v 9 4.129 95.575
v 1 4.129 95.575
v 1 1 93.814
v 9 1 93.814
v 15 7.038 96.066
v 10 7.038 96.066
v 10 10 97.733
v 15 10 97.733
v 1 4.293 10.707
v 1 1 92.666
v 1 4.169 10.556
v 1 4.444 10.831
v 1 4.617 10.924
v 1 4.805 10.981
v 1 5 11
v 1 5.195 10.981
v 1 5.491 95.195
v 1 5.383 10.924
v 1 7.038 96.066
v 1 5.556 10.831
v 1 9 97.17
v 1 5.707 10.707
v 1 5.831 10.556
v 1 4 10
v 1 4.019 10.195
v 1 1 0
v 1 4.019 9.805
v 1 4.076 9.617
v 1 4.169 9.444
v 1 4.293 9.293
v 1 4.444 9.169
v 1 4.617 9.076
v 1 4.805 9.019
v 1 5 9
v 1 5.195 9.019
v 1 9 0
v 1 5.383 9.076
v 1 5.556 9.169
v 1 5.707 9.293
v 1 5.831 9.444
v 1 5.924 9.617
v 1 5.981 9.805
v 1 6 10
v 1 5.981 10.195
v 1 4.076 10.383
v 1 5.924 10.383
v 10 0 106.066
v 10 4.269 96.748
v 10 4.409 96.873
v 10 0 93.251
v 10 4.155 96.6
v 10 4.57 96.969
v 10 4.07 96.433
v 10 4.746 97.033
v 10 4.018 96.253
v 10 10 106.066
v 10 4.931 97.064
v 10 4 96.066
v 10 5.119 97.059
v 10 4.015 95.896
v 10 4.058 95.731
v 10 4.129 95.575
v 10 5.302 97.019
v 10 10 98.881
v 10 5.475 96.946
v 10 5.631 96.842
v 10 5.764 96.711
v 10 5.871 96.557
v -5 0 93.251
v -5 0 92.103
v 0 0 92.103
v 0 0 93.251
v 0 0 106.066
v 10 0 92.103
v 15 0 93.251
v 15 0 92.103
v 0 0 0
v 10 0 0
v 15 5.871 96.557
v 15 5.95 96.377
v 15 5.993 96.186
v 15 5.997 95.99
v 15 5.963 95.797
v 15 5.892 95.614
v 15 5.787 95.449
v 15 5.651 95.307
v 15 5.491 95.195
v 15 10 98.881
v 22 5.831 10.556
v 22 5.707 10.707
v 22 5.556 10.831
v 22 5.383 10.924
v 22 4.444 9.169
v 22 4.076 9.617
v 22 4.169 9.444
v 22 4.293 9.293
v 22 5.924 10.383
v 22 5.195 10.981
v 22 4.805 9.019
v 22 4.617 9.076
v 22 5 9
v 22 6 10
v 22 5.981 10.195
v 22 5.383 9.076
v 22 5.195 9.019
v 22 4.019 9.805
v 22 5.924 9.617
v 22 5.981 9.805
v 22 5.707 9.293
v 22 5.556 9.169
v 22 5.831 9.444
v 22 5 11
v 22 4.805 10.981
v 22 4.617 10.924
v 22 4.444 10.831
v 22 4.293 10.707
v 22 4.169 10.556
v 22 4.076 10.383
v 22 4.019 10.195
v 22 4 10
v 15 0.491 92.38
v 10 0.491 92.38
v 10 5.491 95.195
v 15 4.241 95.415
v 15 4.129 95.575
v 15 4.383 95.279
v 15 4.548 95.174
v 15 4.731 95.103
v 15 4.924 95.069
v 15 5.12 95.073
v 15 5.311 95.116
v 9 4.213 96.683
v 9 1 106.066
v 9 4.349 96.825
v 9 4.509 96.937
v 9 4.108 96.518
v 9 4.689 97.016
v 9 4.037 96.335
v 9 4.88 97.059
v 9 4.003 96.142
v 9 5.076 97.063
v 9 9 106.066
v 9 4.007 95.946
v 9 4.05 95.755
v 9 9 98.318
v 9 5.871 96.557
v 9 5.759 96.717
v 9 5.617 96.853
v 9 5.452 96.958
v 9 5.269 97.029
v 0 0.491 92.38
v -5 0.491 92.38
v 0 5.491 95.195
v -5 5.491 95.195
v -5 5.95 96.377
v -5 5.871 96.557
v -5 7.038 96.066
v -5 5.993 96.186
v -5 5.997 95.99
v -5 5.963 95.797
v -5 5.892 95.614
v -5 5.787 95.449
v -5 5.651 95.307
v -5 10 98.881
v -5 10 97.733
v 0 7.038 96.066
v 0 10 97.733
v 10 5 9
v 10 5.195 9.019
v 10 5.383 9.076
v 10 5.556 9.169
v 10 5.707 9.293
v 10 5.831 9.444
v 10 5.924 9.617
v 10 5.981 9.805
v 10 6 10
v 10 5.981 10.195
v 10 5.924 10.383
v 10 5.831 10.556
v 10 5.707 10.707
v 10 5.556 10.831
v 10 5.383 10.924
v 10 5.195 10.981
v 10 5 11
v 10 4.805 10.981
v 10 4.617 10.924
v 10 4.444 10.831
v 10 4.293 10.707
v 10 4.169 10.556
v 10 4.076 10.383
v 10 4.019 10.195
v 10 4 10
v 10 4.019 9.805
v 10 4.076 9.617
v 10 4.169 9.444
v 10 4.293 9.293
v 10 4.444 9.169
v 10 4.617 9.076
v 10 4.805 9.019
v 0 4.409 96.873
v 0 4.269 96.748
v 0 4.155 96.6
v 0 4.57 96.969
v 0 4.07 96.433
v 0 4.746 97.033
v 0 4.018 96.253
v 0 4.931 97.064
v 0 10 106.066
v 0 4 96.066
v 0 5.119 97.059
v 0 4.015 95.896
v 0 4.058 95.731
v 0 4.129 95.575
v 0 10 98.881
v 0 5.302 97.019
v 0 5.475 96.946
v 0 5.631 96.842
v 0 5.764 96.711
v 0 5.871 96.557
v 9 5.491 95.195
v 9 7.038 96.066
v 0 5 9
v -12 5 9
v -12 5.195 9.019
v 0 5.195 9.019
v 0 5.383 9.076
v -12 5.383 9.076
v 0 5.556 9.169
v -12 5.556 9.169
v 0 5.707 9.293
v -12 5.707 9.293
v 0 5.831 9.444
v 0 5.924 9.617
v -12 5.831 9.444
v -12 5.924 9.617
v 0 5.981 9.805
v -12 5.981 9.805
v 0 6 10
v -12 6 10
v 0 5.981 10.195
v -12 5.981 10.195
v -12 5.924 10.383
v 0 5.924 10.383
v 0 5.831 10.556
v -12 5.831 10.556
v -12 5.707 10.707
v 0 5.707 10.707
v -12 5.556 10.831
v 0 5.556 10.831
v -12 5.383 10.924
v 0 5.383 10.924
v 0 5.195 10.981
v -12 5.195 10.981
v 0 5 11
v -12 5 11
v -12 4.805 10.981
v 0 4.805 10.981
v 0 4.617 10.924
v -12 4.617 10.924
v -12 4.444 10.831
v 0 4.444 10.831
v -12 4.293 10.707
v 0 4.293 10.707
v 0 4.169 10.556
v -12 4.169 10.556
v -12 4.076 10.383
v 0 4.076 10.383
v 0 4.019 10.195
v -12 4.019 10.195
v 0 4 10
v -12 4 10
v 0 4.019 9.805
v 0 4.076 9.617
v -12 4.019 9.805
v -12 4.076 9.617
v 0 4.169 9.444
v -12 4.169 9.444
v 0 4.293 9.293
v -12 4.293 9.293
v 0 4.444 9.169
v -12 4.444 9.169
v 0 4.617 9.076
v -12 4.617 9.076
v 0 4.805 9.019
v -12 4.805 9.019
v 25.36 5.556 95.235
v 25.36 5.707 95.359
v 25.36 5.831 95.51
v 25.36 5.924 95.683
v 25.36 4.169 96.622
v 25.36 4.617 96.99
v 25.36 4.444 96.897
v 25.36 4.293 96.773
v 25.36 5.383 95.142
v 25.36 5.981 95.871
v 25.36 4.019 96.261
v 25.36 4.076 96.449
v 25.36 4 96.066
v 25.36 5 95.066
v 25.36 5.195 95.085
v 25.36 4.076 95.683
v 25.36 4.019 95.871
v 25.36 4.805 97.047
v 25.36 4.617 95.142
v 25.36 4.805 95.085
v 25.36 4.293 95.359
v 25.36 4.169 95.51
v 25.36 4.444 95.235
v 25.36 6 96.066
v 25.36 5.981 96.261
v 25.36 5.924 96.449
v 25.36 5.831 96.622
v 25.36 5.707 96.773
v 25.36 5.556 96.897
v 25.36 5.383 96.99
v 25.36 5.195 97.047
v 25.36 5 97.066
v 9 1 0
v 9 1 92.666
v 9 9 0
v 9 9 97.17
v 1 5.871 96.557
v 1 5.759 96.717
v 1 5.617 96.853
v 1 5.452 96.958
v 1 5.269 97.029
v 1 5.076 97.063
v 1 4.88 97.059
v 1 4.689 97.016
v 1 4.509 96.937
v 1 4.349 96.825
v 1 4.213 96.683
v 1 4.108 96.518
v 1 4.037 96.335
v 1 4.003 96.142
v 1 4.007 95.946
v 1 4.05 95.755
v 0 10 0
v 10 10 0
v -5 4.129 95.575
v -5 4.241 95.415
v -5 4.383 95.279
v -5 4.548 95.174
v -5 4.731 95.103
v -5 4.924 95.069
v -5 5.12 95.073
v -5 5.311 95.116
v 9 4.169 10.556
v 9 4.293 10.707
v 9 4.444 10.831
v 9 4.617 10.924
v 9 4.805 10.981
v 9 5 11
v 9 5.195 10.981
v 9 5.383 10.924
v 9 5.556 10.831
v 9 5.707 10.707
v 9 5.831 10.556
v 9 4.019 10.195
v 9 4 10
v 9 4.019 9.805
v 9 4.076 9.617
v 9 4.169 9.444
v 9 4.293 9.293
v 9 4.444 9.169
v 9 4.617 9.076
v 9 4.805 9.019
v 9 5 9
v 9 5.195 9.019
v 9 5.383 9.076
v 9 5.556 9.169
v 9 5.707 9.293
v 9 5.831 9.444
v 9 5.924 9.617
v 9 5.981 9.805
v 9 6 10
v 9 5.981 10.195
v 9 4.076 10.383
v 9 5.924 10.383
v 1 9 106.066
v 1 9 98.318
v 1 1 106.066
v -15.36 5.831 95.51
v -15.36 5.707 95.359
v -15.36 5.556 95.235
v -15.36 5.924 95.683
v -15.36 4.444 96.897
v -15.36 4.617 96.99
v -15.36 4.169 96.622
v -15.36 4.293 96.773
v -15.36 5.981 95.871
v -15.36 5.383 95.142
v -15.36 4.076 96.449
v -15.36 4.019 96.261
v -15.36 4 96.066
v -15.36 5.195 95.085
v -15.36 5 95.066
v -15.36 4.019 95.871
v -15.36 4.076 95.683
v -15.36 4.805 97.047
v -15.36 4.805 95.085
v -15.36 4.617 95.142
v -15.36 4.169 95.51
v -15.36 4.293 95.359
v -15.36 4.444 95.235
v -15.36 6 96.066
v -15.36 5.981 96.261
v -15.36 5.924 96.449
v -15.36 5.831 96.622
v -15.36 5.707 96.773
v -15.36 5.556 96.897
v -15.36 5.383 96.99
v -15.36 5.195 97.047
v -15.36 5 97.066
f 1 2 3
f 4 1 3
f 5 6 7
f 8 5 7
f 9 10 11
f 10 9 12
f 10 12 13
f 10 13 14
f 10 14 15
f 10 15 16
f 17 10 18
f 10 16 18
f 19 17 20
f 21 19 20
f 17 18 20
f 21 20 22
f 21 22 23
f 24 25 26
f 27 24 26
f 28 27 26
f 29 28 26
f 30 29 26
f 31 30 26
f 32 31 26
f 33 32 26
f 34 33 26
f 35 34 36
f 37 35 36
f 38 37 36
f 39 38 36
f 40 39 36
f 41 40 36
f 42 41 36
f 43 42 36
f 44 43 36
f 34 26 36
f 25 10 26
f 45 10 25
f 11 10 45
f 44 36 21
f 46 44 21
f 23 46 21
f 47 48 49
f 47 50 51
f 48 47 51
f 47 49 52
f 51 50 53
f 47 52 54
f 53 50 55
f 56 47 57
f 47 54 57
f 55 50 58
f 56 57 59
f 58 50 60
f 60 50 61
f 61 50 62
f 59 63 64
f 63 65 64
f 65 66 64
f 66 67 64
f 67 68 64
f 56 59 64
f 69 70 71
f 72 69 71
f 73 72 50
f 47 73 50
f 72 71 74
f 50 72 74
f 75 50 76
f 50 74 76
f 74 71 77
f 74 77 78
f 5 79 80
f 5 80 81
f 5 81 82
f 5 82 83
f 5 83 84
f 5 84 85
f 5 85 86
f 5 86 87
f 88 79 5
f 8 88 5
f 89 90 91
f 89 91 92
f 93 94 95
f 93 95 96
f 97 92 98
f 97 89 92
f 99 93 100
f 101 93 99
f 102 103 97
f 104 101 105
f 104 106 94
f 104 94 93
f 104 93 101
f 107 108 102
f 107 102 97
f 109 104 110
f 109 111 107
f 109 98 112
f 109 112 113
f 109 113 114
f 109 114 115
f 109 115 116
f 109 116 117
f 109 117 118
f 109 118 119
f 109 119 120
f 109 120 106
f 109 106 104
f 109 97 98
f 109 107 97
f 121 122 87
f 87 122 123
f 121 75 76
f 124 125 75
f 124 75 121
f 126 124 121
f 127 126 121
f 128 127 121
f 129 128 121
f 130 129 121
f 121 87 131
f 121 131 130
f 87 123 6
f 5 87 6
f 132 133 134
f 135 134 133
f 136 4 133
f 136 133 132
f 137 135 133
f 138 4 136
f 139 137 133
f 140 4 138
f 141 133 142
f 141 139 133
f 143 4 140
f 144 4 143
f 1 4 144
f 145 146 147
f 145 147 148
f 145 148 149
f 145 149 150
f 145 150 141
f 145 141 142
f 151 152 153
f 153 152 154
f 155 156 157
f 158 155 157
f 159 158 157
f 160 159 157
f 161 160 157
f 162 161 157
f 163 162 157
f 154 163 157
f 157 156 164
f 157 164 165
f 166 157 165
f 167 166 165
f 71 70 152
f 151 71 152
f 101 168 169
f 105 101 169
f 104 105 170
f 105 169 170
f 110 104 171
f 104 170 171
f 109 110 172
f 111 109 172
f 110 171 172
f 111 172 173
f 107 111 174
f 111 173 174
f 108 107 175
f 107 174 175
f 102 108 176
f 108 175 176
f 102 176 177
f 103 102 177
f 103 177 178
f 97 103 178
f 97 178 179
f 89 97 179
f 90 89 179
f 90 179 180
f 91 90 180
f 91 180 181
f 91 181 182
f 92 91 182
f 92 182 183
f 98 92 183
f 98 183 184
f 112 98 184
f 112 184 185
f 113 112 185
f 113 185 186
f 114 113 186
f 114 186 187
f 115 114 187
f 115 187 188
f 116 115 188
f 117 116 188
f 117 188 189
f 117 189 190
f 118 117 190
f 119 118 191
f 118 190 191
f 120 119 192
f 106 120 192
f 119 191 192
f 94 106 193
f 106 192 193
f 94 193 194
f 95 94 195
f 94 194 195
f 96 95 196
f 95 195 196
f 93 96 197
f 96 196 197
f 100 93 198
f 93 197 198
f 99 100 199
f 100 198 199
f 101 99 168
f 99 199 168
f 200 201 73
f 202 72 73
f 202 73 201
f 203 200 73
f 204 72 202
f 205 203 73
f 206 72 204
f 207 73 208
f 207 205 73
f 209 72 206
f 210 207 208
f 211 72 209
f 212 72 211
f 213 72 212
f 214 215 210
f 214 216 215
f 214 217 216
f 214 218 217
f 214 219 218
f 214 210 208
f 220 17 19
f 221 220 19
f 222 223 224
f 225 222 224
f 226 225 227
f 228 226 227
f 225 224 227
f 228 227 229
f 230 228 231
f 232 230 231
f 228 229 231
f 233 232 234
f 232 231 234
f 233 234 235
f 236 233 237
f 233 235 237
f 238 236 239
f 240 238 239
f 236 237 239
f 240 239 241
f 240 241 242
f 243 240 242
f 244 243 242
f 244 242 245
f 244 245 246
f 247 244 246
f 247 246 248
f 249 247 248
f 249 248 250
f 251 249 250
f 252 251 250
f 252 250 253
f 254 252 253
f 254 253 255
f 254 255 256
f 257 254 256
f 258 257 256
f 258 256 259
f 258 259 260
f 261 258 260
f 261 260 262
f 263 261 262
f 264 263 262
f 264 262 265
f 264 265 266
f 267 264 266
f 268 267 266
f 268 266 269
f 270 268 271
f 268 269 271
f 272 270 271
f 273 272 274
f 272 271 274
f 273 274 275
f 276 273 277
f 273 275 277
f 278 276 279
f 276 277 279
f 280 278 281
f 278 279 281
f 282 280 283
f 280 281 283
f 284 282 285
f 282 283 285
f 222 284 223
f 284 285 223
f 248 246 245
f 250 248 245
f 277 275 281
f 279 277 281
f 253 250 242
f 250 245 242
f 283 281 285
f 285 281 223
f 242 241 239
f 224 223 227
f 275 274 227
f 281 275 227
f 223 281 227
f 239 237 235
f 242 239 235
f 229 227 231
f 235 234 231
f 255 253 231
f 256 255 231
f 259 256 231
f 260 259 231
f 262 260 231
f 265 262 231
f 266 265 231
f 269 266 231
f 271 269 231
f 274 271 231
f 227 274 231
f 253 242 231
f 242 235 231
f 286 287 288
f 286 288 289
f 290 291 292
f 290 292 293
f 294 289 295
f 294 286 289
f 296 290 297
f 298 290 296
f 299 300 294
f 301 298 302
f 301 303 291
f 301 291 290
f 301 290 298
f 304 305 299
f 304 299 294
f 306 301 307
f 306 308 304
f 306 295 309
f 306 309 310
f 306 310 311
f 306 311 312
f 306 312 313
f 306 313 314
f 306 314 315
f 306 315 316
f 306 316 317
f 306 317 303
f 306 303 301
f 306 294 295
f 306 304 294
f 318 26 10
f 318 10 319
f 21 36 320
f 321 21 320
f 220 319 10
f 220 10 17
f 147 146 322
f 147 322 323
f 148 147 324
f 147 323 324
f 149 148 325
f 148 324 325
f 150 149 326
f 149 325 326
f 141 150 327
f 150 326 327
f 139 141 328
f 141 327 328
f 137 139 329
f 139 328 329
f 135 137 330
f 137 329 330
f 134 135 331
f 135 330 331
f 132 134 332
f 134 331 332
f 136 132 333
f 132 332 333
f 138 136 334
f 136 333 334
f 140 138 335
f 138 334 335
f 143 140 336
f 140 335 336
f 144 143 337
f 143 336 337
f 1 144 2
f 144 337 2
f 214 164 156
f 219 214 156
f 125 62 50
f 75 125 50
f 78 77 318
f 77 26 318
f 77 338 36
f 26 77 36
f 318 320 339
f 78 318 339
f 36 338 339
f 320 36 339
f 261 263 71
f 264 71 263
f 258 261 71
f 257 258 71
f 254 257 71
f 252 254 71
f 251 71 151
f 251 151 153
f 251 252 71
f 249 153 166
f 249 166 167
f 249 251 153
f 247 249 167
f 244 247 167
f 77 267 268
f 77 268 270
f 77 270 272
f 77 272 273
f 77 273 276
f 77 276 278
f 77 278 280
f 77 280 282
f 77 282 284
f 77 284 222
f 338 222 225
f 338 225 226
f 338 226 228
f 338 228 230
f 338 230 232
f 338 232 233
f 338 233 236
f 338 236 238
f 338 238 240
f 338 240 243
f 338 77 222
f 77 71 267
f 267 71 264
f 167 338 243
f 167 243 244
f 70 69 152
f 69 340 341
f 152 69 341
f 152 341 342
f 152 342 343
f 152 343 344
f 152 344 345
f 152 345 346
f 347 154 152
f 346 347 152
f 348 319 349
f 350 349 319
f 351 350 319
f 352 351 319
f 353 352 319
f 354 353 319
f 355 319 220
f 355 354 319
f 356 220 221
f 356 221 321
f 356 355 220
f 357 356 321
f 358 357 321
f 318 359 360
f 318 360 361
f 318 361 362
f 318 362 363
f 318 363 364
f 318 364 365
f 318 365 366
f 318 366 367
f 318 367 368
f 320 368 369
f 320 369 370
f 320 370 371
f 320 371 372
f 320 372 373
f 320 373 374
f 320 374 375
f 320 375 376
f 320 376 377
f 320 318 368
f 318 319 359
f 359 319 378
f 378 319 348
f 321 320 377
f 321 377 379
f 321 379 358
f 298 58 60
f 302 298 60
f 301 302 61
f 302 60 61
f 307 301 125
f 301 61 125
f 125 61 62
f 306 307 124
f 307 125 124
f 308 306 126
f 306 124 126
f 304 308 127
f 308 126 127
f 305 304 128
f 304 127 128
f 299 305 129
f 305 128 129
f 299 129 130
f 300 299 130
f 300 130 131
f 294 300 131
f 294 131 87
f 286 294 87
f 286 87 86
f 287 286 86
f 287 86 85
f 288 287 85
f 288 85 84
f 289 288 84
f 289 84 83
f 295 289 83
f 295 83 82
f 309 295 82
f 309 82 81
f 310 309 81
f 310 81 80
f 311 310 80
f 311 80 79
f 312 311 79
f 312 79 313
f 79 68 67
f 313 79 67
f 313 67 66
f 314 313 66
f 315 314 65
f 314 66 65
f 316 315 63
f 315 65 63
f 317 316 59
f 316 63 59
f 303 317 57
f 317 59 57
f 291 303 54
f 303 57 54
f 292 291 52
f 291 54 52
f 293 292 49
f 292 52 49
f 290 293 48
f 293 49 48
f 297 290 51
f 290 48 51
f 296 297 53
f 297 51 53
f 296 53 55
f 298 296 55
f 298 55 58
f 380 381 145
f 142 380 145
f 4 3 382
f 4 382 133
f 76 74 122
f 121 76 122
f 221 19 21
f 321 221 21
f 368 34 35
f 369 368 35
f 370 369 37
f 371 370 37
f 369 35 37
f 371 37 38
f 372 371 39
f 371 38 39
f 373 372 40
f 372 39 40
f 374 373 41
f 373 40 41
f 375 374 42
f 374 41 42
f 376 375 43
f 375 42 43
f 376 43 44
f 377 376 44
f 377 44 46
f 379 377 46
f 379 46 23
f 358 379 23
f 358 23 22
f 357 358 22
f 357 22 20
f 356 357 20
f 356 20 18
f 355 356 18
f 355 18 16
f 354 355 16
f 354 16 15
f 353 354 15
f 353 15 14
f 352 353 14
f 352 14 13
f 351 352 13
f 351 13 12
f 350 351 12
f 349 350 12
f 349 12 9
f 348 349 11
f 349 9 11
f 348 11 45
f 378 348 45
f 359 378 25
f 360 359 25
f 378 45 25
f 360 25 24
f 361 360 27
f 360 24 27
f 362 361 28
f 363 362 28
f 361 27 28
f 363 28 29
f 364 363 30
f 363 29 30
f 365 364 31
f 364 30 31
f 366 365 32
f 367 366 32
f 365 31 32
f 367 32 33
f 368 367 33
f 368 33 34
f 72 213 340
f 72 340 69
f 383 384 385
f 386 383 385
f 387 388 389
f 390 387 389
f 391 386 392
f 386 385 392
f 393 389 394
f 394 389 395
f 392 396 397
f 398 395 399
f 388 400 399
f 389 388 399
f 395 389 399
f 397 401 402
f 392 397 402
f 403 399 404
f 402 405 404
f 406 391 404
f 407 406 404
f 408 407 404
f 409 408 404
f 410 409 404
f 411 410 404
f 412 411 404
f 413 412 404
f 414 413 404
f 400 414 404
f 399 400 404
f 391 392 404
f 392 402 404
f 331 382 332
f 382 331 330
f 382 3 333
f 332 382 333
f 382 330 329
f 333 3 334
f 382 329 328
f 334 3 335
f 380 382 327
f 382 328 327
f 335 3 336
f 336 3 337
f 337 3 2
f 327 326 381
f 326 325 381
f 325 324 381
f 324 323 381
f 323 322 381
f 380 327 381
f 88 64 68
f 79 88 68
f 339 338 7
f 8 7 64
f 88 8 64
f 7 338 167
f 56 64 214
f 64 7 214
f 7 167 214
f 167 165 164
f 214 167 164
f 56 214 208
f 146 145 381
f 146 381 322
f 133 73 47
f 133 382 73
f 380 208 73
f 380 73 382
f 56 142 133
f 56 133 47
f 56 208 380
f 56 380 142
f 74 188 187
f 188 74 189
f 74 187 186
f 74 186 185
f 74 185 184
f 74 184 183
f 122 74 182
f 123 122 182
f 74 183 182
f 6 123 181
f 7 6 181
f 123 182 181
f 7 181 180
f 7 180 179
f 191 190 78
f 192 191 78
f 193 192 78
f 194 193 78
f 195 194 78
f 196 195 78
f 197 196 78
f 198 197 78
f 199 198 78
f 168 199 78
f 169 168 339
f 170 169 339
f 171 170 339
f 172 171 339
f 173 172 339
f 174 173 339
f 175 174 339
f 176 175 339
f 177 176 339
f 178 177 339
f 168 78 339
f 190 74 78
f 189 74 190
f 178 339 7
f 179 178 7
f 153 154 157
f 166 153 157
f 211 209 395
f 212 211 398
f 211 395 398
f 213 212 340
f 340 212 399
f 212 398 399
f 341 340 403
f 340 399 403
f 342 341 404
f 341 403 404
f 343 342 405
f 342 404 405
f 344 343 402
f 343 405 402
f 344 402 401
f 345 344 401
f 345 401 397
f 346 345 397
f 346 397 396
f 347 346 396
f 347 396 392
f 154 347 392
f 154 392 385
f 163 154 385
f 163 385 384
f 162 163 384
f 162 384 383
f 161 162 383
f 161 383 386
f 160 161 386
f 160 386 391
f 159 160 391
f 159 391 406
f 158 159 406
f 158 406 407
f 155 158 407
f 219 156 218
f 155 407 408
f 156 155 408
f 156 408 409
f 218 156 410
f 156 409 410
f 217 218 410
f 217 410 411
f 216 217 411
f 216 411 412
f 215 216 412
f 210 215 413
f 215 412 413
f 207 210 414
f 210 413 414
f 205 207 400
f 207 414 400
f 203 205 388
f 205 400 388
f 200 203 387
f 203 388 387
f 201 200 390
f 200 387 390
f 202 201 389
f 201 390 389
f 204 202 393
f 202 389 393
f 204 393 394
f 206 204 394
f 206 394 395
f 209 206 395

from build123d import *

# Parameters (mm, degrees)
SKETCH_1_W           = 10
SKETCH_1_H           = 10
SKETCH_1_W_2         = 8
SKETCH_1_H_2         = 8
EXTRUDE_1_DEPTH      = 106.066
SKETCH_2_R           = 1
CUT_EXTRUDE_1_DEPTH  = 10
EXTRUDE_3_DEPTH      = 12
EXTRUDE_3_DEPTH_BACK = 22
SKETCH_5_R           = 1
EXTRUDE_7_DEPTH      = 15.36
EXTRUDE_7_DEPTH_BACK = 25.36
SKETCH_9_R           = 1
EXTRUDE_8_DEPTH      = 5
EXTRUDE_8_DEPTH_BACK = 15


with BuildPart() as part:
    # 草图1 → 凸台-拉伸1 (new body)
    with BuildSketch(Plane.XY):
        with Locations((5, 5)):
            Rectangle(SKETCH_1_W, SKETCH_1_H)
        with Locations((5, 5)):
            Rectangle(SKETCH_1_W_2, SKETCH_1_H_2, mode=Mode.SUBTRACT)
    extrude(amount=EXTRUDE_1_DEPTH)

    # 草图2 → 切除-拉伸1 (cut)
    with BuildSketch(Plane(origin=(10, 0, 0), x_dir=(0, 0, -1), z_dir=(1, 0, 0))):
        with Locations((-10, 5)):
            Circle(SKETCH_2_R)
    extrude(amount=-CUT_EXTRUDE_1_DEPTH, mode=Mode.SUBTRACT)

    # 草图5 → 凸台-拉伸3 (add, two sides: drawn at the far end of the back side and taken through both)
    with BuildSketch(Plane(origin=(10, 0, 0), x_dir=(0, 0, -1), z_dir=(1, 0, 0)).offset(-EXTRUDE_3_DEPTH_BACK)):
        with Locations((-10, 5)):
            Circle(SKETCH_5_R)
    extrude(amount=EXTRUDE_3_DEPTH + EXTRUDE_3_DEPTH_BACK)

    # 草图9 → 凸台-拉伸7 (add, two sides: drawn at the far end of the back side and taken through both)
    with BuildSketch(Plane(origin=(10, 0, 0), x_dir=(0, 0, -1), z_dir=(1, 0, 0)).offset(-EXTRUDE_7_DEPTH_BACK)):
        with Locations((-96.066, 5)):
            Circle(SKETCH_9_R)
    extrude(amount=EXTRUDE_7_DEPTH + EXTRUDE_7_DEPTH_BACK)

    # 草图10 → 凸台-拉伸8 (add, two sides: drawn at the far end of the back side and taken through both)
    with BuildSketch(Plane(origin=(10, 0, 0), x_dir=(0, 0, -1), z_dir=(1, 0, 0)).offset(-EXTRUDE_8_DEPTH_BACK)):
        Polygon((-93.251, 0), (-92.103407302, 0), (-97.733407302, 10), (-98.881, 10), align=None)
    extrude(amount=EXTRUDE_8_DEPTH + EXTRUDE_8_DEPTH_BACK)


solid = part.part
